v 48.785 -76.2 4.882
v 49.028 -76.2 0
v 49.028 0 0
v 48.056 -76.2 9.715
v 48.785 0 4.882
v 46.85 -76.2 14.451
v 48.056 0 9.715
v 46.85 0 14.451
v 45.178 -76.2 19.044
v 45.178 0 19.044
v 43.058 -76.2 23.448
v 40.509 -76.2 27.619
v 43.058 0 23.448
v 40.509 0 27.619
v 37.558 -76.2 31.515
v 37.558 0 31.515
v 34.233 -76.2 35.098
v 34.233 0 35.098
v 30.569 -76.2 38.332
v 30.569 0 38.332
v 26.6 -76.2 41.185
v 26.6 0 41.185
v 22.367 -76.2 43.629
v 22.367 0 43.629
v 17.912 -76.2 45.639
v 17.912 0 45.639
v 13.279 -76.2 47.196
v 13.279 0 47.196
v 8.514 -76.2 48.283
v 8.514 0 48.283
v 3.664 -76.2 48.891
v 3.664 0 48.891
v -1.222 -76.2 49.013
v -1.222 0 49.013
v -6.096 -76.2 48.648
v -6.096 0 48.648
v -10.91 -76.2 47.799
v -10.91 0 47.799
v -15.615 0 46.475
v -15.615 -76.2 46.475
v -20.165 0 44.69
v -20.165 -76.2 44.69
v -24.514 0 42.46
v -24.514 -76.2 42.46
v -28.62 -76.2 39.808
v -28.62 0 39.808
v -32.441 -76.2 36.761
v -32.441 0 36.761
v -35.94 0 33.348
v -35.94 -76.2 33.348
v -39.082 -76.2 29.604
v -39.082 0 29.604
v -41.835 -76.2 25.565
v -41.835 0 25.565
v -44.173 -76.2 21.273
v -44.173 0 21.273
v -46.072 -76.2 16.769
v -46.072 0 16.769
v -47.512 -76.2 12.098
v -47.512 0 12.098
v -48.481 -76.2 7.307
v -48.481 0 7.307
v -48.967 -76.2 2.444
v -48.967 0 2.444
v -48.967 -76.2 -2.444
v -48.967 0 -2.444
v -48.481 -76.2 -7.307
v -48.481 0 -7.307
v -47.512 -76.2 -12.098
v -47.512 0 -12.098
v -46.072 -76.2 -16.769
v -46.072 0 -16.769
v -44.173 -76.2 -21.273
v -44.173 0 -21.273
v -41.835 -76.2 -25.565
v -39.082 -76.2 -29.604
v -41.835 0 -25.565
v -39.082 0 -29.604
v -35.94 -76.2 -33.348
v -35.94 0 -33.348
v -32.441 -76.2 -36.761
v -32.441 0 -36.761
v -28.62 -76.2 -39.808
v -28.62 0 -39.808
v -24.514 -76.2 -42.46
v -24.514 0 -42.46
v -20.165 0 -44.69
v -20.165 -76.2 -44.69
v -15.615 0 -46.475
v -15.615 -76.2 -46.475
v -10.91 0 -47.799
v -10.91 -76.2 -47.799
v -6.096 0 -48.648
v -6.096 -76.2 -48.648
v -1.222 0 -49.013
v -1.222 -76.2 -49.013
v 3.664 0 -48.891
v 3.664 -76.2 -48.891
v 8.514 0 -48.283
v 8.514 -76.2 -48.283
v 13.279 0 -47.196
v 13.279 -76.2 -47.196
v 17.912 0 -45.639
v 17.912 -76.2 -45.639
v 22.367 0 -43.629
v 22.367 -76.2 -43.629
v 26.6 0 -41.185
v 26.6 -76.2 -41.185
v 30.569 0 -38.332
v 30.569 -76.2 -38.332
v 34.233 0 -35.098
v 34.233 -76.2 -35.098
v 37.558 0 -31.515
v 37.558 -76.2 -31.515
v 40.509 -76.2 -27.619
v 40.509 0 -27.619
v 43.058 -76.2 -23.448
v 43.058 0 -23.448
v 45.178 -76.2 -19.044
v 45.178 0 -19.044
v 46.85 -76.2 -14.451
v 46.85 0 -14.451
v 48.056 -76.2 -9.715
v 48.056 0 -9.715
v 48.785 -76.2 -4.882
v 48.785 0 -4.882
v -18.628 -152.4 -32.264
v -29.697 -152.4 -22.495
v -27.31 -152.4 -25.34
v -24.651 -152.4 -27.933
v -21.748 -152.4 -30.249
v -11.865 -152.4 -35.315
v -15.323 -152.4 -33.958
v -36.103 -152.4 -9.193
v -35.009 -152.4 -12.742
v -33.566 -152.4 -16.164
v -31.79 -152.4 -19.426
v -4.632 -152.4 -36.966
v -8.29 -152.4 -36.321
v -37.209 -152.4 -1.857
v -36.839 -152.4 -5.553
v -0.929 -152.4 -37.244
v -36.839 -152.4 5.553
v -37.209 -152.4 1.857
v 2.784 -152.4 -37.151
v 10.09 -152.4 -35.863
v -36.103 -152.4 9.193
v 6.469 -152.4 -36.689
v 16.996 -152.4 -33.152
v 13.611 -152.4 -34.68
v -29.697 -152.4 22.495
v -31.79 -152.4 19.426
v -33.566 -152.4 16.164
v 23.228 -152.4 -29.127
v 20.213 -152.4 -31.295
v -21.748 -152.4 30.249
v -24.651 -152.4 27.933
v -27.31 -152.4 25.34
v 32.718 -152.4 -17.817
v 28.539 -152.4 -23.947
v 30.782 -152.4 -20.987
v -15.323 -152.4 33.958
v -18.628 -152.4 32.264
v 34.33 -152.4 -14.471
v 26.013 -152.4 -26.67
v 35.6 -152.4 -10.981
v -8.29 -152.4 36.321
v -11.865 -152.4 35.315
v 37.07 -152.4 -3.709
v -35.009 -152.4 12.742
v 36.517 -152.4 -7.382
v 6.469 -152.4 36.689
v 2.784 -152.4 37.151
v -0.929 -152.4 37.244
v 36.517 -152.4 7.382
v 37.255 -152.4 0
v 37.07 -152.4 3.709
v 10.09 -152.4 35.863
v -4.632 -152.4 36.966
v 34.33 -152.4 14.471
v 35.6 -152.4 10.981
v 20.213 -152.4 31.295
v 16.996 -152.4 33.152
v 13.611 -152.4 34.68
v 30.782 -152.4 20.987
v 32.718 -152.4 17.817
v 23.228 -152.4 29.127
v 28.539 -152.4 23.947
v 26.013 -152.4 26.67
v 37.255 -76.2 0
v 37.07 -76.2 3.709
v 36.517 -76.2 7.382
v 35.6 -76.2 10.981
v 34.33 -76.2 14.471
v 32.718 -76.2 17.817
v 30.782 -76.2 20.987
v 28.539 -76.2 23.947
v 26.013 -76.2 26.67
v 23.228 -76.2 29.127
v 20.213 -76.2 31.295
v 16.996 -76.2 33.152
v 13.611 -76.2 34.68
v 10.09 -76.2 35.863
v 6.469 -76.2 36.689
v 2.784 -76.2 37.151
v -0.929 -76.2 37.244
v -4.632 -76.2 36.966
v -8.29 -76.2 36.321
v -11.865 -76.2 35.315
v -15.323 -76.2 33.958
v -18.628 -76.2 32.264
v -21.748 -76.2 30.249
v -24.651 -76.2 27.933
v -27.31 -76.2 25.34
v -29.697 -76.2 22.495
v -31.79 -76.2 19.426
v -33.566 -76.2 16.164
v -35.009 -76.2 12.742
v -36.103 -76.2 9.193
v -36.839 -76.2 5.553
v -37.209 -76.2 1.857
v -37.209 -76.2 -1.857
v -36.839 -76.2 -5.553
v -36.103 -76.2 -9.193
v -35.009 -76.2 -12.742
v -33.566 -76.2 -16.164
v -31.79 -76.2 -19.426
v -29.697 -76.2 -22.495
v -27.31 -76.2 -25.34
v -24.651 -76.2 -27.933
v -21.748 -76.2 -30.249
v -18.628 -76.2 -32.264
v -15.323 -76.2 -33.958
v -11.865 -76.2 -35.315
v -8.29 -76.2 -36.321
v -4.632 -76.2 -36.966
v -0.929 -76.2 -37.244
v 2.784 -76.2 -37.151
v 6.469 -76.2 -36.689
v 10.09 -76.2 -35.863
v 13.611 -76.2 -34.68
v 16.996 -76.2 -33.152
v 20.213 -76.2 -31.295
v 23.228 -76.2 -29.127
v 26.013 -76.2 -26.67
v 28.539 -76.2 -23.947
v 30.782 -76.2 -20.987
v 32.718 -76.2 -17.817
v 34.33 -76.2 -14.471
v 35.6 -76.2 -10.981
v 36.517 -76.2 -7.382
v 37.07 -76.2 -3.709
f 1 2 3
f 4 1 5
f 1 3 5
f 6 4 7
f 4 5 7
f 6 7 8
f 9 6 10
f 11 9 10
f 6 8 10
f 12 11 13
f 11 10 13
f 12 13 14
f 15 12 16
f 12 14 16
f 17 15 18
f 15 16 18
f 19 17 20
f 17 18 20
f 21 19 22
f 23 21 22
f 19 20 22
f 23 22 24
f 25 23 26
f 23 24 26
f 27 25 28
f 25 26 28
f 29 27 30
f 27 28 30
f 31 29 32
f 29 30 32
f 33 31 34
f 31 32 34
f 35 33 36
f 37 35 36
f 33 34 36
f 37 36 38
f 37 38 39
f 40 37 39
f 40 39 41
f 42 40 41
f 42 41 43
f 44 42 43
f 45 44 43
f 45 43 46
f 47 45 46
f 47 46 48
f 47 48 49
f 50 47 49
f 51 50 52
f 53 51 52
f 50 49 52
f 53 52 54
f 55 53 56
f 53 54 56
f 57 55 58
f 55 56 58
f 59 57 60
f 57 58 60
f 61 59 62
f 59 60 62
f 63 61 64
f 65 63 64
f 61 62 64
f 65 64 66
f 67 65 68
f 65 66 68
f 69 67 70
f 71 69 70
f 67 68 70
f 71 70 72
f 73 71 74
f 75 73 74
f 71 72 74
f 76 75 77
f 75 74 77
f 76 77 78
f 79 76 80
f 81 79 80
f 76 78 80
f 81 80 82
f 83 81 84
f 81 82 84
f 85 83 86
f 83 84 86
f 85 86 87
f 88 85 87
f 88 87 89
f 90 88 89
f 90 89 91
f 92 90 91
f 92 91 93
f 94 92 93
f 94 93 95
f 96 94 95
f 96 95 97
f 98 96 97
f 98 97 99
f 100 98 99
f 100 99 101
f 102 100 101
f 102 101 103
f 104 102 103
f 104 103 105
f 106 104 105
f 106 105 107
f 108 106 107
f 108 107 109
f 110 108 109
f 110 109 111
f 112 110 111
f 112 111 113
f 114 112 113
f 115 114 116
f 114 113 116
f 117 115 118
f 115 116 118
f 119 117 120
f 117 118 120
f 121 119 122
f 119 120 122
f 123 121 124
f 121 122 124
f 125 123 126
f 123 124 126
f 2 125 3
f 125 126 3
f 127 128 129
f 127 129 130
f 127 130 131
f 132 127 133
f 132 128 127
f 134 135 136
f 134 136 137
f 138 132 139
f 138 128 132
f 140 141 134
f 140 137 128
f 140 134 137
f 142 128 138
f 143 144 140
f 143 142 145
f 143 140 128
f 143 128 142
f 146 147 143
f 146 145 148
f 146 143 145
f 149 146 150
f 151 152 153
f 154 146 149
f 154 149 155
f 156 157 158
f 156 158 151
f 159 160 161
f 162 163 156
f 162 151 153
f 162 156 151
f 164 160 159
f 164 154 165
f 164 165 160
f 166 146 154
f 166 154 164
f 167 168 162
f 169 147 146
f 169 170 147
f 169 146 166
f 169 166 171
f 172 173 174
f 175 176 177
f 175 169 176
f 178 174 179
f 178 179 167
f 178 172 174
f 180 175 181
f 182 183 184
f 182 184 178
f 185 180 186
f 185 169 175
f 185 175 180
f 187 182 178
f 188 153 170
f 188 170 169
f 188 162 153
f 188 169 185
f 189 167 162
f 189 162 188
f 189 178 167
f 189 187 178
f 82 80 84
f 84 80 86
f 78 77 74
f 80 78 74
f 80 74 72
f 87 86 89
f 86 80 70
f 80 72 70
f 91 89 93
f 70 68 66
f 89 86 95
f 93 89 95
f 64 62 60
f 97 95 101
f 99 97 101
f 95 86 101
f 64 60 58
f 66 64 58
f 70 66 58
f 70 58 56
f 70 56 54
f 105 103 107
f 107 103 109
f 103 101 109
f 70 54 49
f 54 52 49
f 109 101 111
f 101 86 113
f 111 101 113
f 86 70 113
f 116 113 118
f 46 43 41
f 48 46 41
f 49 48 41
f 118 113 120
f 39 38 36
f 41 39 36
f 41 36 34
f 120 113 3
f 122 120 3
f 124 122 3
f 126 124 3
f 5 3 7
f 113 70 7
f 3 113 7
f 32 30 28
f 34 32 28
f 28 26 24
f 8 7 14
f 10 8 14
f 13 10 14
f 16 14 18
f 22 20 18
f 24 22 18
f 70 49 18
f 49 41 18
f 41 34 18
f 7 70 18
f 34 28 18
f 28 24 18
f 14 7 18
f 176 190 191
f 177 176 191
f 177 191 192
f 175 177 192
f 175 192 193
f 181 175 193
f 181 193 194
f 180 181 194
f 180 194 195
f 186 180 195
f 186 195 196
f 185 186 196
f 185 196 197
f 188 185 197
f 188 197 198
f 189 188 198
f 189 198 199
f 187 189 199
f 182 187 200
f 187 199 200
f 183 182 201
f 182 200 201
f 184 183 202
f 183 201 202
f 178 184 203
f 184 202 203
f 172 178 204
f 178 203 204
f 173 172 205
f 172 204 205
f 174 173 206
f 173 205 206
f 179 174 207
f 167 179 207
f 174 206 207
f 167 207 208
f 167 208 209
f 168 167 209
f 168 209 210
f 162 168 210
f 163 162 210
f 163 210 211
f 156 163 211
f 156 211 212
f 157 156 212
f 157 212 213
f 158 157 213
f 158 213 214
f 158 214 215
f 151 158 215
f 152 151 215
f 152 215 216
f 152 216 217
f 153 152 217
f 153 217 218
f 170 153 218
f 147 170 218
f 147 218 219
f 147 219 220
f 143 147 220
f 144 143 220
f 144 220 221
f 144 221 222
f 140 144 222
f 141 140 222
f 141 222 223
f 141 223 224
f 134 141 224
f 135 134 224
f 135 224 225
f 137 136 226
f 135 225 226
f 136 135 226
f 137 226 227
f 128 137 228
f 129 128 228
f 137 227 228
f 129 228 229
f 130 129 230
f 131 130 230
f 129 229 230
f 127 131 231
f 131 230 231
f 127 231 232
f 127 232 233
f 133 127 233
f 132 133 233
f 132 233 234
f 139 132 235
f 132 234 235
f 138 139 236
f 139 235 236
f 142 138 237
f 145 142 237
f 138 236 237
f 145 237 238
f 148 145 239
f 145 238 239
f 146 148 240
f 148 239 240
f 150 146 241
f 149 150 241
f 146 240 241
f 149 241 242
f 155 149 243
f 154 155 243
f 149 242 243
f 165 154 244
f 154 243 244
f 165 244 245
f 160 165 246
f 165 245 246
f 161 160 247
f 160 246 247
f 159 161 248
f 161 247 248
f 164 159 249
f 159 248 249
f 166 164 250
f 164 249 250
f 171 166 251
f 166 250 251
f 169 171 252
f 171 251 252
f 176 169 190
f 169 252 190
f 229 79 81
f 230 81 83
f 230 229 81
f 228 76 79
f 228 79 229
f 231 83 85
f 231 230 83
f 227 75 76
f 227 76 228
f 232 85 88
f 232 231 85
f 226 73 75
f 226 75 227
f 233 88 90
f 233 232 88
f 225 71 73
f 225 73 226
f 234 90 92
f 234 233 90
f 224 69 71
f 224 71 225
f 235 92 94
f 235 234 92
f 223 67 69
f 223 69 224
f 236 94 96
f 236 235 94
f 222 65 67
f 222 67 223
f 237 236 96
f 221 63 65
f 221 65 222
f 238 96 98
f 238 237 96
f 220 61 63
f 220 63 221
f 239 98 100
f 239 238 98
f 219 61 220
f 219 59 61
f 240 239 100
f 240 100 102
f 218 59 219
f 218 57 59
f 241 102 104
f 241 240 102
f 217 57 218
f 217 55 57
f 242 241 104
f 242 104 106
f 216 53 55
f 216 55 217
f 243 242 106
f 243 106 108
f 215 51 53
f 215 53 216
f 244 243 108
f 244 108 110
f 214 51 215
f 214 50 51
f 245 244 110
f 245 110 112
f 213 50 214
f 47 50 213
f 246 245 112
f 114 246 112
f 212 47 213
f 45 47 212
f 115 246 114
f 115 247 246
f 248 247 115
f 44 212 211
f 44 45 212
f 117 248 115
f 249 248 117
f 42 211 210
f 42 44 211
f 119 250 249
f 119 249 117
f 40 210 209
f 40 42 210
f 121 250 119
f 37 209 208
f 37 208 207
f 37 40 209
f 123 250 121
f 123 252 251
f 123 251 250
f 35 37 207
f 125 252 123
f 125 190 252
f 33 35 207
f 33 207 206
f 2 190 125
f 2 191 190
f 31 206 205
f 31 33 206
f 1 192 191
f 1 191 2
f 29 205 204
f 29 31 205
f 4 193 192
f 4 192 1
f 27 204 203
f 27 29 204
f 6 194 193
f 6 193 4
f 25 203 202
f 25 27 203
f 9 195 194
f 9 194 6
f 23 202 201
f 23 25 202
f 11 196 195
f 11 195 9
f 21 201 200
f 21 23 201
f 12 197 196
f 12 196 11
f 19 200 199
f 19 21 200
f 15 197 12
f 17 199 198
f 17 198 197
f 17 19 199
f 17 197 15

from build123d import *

# Parameters (mm, degrees)
F0_R     = 49.0283190444
F1_DEPTH = 76.2
F2_R     = 37.255304708
F3_DEPTH = 152.4
F4_R     = 23.611936081
F5_DEPTH = 273


# Not quite as in the source:
# - an extrude ends at something that could not be found from the text; its depth is read off the source's solid


with BuildPart() as f1:
    # F0 (on Front) → F1 (new body)
    with BuildSketch(Plane.XZ):
        Circle(F0_R)
    extrude(amount=F1_DEPTH)

    # F2 (on Front) → F3 (join)
    with BuildSketch(Plane.XZ):
        Circle(F2_R)
    extrude(amount=F3_DEPTH)

    # F4 (on Front) → F5 (cut, through all)
    with BuildSketch(Plane.XZ):
        Circle(F4_R)
    extrude(amount=-F5_DEPTH, mode=Mode.SUBTRACT)


solid = f1.part
